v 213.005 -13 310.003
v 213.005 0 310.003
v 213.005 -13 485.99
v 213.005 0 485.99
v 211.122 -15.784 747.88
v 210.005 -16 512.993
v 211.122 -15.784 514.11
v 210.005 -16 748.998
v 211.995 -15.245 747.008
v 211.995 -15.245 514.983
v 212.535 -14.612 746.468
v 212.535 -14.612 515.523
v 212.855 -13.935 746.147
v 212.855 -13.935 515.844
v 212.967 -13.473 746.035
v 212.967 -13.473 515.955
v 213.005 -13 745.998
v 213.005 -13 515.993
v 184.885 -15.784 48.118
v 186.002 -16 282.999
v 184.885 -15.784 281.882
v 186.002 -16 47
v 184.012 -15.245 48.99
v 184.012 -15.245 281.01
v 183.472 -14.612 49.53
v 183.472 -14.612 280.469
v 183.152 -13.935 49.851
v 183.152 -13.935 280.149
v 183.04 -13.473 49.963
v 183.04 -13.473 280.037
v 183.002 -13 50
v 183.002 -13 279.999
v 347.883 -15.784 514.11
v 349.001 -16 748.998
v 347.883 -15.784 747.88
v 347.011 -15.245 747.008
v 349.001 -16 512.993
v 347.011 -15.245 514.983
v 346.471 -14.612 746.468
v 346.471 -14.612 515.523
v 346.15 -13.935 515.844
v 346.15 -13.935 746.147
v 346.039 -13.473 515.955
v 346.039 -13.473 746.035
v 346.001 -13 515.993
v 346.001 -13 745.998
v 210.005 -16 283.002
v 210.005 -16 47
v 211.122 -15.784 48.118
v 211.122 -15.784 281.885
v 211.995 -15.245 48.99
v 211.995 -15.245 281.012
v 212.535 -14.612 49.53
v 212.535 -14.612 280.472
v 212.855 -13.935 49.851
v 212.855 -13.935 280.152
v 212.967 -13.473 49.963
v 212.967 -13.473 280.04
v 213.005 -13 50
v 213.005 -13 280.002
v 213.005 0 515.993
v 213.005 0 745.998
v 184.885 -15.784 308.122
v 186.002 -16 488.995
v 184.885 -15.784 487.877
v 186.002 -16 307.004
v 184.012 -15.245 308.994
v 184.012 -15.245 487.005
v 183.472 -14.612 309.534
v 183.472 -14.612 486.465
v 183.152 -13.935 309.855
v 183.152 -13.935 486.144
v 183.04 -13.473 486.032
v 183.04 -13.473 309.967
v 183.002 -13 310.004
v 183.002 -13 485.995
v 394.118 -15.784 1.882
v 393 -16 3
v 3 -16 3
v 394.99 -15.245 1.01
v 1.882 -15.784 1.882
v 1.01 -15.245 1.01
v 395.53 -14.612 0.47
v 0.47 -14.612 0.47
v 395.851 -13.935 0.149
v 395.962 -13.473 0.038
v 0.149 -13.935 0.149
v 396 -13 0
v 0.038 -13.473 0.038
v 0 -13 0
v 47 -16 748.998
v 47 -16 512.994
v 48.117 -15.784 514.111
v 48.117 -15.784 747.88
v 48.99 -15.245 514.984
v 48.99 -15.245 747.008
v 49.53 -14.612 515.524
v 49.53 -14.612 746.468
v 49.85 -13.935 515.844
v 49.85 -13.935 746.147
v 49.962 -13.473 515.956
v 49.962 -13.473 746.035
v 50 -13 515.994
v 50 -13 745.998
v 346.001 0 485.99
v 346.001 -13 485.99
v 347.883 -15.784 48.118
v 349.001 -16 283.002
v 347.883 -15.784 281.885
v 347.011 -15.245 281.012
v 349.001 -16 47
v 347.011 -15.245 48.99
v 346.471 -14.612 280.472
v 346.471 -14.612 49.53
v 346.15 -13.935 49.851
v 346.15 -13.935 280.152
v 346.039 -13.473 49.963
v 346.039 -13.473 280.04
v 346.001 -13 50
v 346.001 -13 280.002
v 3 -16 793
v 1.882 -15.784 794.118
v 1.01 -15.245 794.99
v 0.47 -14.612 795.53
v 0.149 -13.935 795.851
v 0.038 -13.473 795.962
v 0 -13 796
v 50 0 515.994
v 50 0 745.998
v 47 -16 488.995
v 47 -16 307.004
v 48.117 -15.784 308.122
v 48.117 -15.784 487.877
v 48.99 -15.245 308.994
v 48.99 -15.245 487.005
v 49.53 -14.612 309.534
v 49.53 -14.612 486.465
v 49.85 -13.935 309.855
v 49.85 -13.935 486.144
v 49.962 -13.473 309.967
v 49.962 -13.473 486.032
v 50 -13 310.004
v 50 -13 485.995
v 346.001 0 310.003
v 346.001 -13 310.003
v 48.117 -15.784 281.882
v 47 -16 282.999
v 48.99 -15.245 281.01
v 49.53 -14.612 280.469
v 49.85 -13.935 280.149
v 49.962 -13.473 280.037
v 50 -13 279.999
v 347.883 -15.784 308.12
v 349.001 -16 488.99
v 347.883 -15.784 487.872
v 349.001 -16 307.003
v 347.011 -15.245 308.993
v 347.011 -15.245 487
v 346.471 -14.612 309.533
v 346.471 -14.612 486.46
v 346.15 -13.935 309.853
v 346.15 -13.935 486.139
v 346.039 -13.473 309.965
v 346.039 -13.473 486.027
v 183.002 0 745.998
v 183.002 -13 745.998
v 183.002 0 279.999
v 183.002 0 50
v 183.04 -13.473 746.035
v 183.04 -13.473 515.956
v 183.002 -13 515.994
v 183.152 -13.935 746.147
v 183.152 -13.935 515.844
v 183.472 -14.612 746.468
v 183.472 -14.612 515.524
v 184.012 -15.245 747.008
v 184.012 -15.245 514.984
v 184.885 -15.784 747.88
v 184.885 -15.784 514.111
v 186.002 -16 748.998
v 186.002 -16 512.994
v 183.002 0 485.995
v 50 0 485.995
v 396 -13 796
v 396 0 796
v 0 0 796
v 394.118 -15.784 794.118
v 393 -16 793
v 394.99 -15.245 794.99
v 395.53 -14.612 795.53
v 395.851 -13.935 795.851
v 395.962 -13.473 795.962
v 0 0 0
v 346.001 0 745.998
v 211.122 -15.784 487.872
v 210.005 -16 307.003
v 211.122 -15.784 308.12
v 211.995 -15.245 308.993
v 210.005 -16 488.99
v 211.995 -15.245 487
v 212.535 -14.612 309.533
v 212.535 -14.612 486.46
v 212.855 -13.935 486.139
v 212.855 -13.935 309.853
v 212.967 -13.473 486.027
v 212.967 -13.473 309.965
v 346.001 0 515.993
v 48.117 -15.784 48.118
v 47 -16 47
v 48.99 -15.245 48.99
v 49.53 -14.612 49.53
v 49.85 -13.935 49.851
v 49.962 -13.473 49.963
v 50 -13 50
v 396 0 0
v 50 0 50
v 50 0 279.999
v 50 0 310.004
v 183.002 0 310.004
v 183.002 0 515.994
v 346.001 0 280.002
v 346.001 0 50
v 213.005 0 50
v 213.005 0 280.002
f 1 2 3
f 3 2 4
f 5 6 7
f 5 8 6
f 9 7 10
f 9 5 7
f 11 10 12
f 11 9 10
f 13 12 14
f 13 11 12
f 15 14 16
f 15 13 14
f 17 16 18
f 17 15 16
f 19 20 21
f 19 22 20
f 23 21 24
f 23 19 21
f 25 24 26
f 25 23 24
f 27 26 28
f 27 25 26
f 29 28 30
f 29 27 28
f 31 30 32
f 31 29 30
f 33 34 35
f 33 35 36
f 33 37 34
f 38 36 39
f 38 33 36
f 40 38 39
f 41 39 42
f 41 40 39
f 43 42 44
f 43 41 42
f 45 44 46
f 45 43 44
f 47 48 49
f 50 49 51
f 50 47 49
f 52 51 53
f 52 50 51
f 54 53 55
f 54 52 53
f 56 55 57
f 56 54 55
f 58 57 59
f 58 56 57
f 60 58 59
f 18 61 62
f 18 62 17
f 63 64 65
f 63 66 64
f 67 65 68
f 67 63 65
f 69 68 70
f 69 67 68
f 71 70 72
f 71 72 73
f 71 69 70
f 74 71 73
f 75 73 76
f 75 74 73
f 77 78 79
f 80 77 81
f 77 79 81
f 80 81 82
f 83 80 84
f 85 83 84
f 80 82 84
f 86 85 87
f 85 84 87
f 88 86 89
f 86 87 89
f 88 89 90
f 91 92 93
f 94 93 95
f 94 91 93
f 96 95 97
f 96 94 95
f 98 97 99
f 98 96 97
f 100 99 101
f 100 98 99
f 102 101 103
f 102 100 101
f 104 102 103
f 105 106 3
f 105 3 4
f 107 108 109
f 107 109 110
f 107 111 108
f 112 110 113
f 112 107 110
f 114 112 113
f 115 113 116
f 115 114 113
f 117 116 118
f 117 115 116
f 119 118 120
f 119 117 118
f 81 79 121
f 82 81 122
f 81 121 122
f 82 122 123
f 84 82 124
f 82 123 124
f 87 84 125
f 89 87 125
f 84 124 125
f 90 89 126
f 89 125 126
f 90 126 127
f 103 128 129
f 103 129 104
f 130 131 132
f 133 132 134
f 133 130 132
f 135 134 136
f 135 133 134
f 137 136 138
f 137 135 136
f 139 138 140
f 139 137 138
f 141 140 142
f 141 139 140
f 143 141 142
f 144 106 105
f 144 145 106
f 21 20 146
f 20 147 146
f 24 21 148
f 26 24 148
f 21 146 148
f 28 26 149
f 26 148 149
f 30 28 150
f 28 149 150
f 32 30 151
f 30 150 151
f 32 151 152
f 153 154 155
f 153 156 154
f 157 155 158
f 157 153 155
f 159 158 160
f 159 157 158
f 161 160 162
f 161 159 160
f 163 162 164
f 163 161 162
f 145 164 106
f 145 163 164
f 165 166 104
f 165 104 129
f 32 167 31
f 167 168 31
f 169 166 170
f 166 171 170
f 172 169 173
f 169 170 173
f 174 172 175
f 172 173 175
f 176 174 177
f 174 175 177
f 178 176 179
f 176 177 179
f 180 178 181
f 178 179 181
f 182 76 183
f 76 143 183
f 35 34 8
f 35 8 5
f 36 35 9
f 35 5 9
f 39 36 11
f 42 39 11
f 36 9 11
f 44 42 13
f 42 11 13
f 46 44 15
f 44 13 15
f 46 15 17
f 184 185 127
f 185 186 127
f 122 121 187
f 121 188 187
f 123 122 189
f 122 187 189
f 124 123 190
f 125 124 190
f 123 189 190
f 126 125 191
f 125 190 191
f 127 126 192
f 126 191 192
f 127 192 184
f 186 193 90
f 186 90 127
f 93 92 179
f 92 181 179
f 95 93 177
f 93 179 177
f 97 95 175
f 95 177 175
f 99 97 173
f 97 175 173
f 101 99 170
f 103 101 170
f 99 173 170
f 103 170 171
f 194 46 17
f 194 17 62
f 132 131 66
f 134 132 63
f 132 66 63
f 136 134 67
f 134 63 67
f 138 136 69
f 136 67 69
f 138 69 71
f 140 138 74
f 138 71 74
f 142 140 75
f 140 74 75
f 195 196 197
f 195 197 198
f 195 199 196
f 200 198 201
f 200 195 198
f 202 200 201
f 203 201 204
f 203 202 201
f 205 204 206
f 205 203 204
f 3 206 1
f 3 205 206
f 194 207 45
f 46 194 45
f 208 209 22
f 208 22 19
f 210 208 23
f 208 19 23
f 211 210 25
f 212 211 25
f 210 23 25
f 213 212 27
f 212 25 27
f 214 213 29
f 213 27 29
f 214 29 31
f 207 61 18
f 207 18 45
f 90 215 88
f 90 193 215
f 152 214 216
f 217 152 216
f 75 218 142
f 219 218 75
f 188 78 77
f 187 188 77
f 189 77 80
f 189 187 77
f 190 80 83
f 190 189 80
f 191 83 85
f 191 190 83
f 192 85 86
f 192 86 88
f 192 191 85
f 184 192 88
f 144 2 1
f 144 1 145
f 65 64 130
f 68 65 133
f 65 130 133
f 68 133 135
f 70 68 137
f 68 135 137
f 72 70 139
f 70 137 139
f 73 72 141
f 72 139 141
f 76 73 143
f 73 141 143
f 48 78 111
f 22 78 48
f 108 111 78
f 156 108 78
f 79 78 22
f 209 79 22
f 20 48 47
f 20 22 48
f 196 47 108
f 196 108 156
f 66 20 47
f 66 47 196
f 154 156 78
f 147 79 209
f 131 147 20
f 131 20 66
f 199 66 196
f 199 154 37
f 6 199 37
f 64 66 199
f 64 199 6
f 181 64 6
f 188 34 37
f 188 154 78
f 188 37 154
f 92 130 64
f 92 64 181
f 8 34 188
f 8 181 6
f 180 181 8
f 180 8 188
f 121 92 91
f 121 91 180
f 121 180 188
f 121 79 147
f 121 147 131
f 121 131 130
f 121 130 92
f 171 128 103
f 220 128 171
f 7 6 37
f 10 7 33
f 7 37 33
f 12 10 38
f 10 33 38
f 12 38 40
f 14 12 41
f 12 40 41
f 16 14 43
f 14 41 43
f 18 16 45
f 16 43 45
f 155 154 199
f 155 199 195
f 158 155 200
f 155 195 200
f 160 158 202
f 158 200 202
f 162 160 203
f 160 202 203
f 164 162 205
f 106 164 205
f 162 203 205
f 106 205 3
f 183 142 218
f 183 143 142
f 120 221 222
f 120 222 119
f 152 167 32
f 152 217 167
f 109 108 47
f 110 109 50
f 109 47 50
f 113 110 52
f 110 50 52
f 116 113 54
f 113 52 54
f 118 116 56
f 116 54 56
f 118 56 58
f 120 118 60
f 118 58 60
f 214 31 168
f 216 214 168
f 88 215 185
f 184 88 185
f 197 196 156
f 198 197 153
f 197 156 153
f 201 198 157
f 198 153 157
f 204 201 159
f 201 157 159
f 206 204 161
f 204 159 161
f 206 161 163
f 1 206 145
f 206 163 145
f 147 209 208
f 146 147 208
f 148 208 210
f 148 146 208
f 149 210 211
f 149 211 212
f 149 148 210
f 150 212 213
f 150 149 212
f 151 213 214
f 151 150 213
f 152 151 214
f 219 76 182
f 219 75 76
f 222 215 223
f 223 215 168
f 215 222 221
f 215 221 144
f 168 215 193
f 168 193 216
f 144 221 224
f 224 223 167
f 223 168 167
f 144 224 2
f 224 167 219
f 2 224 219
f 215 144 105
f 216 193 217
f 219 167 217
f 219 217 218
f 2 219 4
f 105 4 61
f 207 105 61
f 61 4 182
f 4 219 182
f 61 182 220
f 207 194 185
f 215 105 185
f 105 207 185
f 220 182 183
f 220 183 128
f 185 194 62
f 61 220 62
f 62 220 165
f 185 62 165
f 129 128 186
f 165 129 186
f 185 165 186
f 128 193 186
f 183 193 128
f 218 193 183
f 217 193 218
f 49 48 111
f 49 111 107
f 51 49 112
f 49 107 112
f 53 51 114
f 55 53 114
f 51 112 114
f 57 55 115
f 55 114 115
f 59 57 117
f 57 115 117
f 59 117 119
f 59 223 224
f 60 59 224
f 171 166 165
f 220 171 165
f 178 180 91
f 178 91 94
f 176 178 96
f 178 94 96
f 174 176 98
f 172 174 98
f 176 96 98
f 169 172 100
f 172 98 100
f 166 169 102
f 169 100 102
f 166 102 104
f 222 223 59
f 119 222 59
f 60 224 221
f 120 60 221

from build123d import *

# Parameters (mm, degrees)
F0_W      = 28.8499742746
F0_H      = 37.8827601671
F1_DEPTH  = 16
F2_DEPTH  = 296
F3_DEPTH  = 996
F4_W      = 199.8313069344
F4_H      = 801.1276721954
F5_DEPTH  = 5
F6_DEPTH  = 39.21
F7_DEPTH  = 2.24
F8_DEPTH  = 55.66
F9_DEPTH  = 1.59
F10_W     = 54.77245152
F10_H     = 895.9976721954
F11_DEPTH = 5
F12_DEPTH = 5.86
F13_DEPTH = 18.91
F14_W     = 83.0026693535
F14_H     = 34.9487662315
F14_H_2   = 55.274695158
F15_W     = 82.9961860609
F15_H     = 44.8832511902
F15_H_2   = 52.5203943253
F16_DEPTH = 5
F17_DEPTH = 300
F18_DEPTH = 300
F19_DEPTH = 324.79
F20_DEPTH = 324.79
F21_DEPTH = 250
F22_DEPTH = 250
F23_DEPTH = 100
F24_DEPTH = 100
F25_DEPTH = 50
F26_DEPTH = 50
F27_DEPTH = 134.02
F28_DEPTH = 100
F29_DEPTH = 100
F30_DEPTH = 100
F31_DEPTH = 50
F32_DEPTH = 54.95
F33_DEPTH = 50
F34_DEPTH = 109.29
F35_DEPTH = 14.88
F36_DEPTH = 230.15
F37_DEPTH = 230.15
F38_DEPTH = 22.52
F39_DEPTH = 77.2
F40_DEPTH = 77.2
F41_DEPTH = 11
F42_DEPTH = 200
F43_DEPTH = 200
F44_DEPTH = 200
F45_DEPTH = 70
F46_DEPTH = 70
F47_DEPTH = 70
F48_DEPTH = 70
F49_DEPTH = 100
F50_DEPTH = 50
F51_DEPTH = 100
F52_DEPTH = 50
F53_R     = 3


with BuildPart() as f1:
    # F0 (on Front) → F1 (new body)
    with BuildSketch(Plane.XZ):
        with Locations((14.4249871373, 18.9413800836)):
            Rectangle(F0_W, F0_H)
    extrude(amount=F1_DEPTH)

    # F2 (add): a face of the model
    f2_faces = [f1.faces().sort_by_distance(p)[0] for p in [
        (0, -8, 18.9413800836),
    ]]
    extrude(f2_faces, amount=-F2_DEPTH)

    # F3 (add): a face of the model
    f3_faces = [f1.faces().sort_by_distance(p)[0] for p in [
        (148, -8, 0),
    ]]
    extrude(f3_faces, amount=-F3_DEPTH)

    # F4 (on face) → F5 (cut)
    with BuildSketch(Plane.XZ.offset(16)):
        with Locations((148.3252942562, 506.2239170074)):
            Rectangle(F4_W, F4_H)
    extrude(amount=-F5_DEPTH, mode=Mode.SUBTRACT)

    # F6 (cut): a face of the model
    f6_faces = [f1.faces().sort_by_distance(p)[0] for p in [
        (148.3252942562, -13.5, 906.7877531052),
    ]]
    extrude(f6_faces, amount=-F6_DEPTH, mode=Mode.SUBTRACT)

    # F7 (add): a face of the model
    f7_faces = [f1.faces().sort_by_distance(p)[0] for p in [
        (248.2409477234, -13.5, 525.8289170074),
    ]]
    extrude(f7_faces, amount=F7_DEPTH)

    # F8 (cut): a face of the model
    f8_faces = [f1.faces().sort_by_distance(p)[0] for p in [
        (147.2052942562, -13.5, 105.6600809097),
    ]]
    extrude(f8_faces, amount=-F8_DEPTH, mode=Mode.SUBTRACT)

    # F9 (add): a face of the model
    f9_faces = [f1.faces().sort_by_distance(p)[0] for p in [
        (48.409640789, -13.5, 497.9989170074),
    ]]
    extrude(f9_faces, amount=F9_DEPTH)

    # F10 (on face) → F11 (join)
    with BuildSketch(Plane.XZ.offset(11)):
        with Locations((154.5285359025, 497.9989170074)):
            Rectangle(F10_W, F10_H)
    extrude(amount=F11_DEPTH)

    # F12 (cut): a face of the model
    f12_faces = [f1.faces().sort_by_distance(p)[0] for p in [
        (127.1423101425, -13.5, 497.9989170074),
    ]]
    extrude(f12_faces, amount=-F12_DEPTH, mode=Mode.SUBTRACT)

    # F13 (cut): a face of the model
    f13_faces = [f1.faces().sort_by_distance(p)[0] for p in [
        (181.9147616625, -13.5, 497.9989170074),
    ]]
    extrude(f13_faces, amount=-F13_DEPTH, mode=Mode.SUBTRACT)

    # F14 (on face) + F15 (on face) → F16 (join)
    with BuildSketch(Plane.XZ.offset(11)):
        with Locations((91.5009754658, 853.3093035221)):
            Rectangle(F14_W, F14_H)
        with Locations((91.5009754658, 511.6568356752)):
            Rectangle(F14_W, F14_H_2)
    with BuildSketch(Plane.XZ.offset(11)):
        with Locations((204.5028546929, 853.7013530731)):
            Rectangle(F15_W, F15_H)
        with Locations((204.5028546929, 576.5425562859)):
            Rectangle(F15_W, F15_H_2)
    extrude(amount=F16_DEPTH)

    # F17 (add): faces of the model
    f17_faces = [f1.faces().sort_by_distance(p)[0] for p in [
        (204.5028546929, -13.5, 550.2823591232),
        (91.5009754658, -13.5, 484.0194880962),
    ]]
    extrude(f17_faces, amount=F17_DEPTH)

    # F18 (cut): faces of the model
    f18_faces = [f1.faces().sort_by_distance(p)[0] for p in [
        (91.5009754658, -13.5, 539.2941832542),
        (204.5028546929, -13.5, 602.8027534485),
    ]]
    extrude(f18_faces, amount=-F18_DEPTH, mode=Mode.SUBTRACT)

    # F19 (add): a face of the model
    f19_faces = [f1.faces().sort_by_distance(p)[0] for p in [
        (91.5009754658, -13.5, 835.8349204063),
    ]]
    extrude(f19_faces, amount=F19_DEPTH)

    # F20 (cut): a face of the model
    f20_faces = [f1.faces().sort_by_distance(p)[0] for p in [
        (91.5009754658, -13.5, 870.7836866379),
    ]]
    extrude(f20_faces, amount=-F20_DEPTH, mode=Mode.SUBTRACT)

    # F21 (add): a face of the model
    f21_faces = [f1.faces().sort_by_distance(p)[0] for p in [
        (91.5009754658, -13.5, 239.2941832542),
    ]]
    extrude(f21_faces, amount=F21_DEPTH)

    # F22 (cut): a face of the model
    f22_faces = [f1.faces().sort_by_distance(p)[0] for p in [
        (91.5009754658, -13.5, 184.0194880962),
    ]]
    extrude(f22_faces, amount=-F22_DEPTH, mode=Mode.SUBTRACT)

    # F23 (add): a face of the model
    f23_faces = [f1.faces().sort_by_distance(p)[0] for p in [
        (91.5009754658, -13.5, 545.9936866379),
    ]]
    extrude(f23_faces, amount=F23_DEPTH)

    # F24 (cut): a face of the model
    f24_faces = [f1.faces().sort_by_distance(p)[0] for p in [
        (91.5009754658, -13.5, 511.0449204063),
    ]]
    extrude(f24_faces, amount=-F24_DEPTH, mode=Mode.SUBTRACT)

    # F25 (add): a face of the model
    f25_faces = [f1.faces().sort_by_distance(p)[0] for p in [
        (91.5009754658, -13.5, 645.9936866379),
    ]]
    extrude(f25_faces, amount=F25_DEPTH)

    # F26 (cut): a face of the model
    f26_faces = [f1.faces().sort_by_distance(p)[0] for p in [
        (91.5009754658, -13.5, 611.0449204063),
    ]]
    extrude(f26_faces, amount=-F26_DEPTH, mode=Mode.SUBTRACT)

    # F27 (add): a face of the model
    f27_faces = [f1.faces().sort_by_distance(p)[0] for p in [
        (91.5009754658, -13.5, 434.0194880962),
    ]]
    extrude(f27_faces, amount=F27_DEPTH)

    # F28 (cut): a face of the model
    f28_faces = [f1.faces().sort_by_distance(p)[0] for p in [
        (91.5009754658, -13.5, 299.9994880962),
    ]]
    extrude(f28_faces, amount=-F28_DEPTH, mode=Mode.SUBTRACT)

    # F29 (add): a face of the model
    f29_faces = [f1.faces().sort_by_distance(p)[0] for p in [
        (91.5009754658, -13.5, 661.0449204063),
    ]]
    extrude(f29_faces, amount=F29_DEPTH)

    # F30 (cut): a face of the model
    f30_faces = [f1.faces().sort_by_distance(p)[0] for p in [
        (91.5009754658, -13.5, 695.9936866379),
    ]]
    extrude(f30_faces, amount=-F30_DEPTH, mode=Mode.SUBTRACT)

    # F31 (add): a face of the model
    f31_faces = [f1.faces().sort_by_distance(p)[0] for p in [
        (91.5009754658, -13.5, 595.9936866379),
    ]]
    extrude(f31_faces, amount=F31_DEPTH)

    # F32 (cut): a face of the model
    f32_faces = [f1.faces().sort_by_distance(p)[0] for p in [
        (91.5009754658, -13.5, 561.0449204063),
    ]]
    extrude(f32_faces, amount=-F32_DEPTH, mode=Mode.SUBTRACT)

    # F33 (add): a face of the model
    f33_faces = [f1.faces().sort_by_distance(p)[0] for p in [
        (91.5009754658, -13.5, 399.9994880962),
    ]]
    extrude(f33_faces, amount=F33_DEPTH)

    # F34 (cut): a face of the model
    f34_faces = [f1.faces().sort_by_distance(p)[0] for p in [
        (91.5009754658, -13.5, 489.2941832542),
    ]]
    extrude(f34_faces, amount=-F34_DEPTH, mode=Mode.SUBTRACT)

    # F35 (cut): a face of the model
    f35_faces = [f1.faces().sort_by_distance(p)[0] for p in [
        (204.5028546929, -13.5, 831.259727478),
    ]]
    extrude(f35_faces, amount=-F35_DEPTH, mode=Mode.SUBTRACT)

    # F36 (add): a face of the model
    f36_faces = [f1.faces().sort_by_distance(p)[0] for p in [
        (204.5028546929, -13.5, 846.139727478),
    ]]
    extrude(f36_faces, amount=F36_DEPTH)

    # F37 (cut): a face of the model
    f37_faces = [f1.faces().sort_by_distance(p)[0] for p in [
        (204.5028546929, -13.5, 876.1429786682),
    ]]
    extrude(f37_faces, amount=-F37_DEPTH, mode=Mode.SUBTRACT)

    # F38 (cut): a face of the model
    f38_faces = [f1.faces().sort_by_distance(p)[0] for p in [
        (204.5028546929, -13.5, 250.2823591232),
    ]]
    extrude(f38_faces, amount=-F38_DEPTH, mode=Mode.SUBTRACT)

    # F39 (add): a face of the model
    f39_faces = [f1.faces().sort_by_distance(p)[0] for p in [
        (204.5028546929, -13.5, 302.8027534485),
    ]]
    extrude(f39_faces, amount=F39_DEPTH)

    # F40 (cut): a face of the model
    f40_faces = [f1.faces().sort_by_distance(p)[0] for p in [
        (204.5028546929, -13.5, 272.8023591232),
    ]]
    extrude(f40_faces, amount=-F40_DEPTH, mode=Mode.SUBTRACT)

    # F41 (cut): faces of the model
    f41_faces = [f1.faces().sort_by_distance(p)[0] for p in [
        (91.5009754658, -11, 795.9957198715),
        (204.5028546929, -11, 795.9953658867),
        (204.5028546929, -11, 497.9962404633),
        (91.5009754658, -11, 497.9995518303),
        (91.5009754658, -11, 199.999784503),
        (204.5028546929, -11, 200.0012200165),
    ]]
    extrude(f41_faces, amount=-F41_DEPTH, mode=Mode.SUBTRACT)

    # F42 (add): faces of the model
    f42_faces = [f1.faces().sort_by_distance(p)[0] for p in [
        (204.5028546929, -8, 615.989727478),
        (91.5009754658, -8, 615.9949204063),
    ]]
    extrude(f42_faces, amount=F42_DEPTH)

    # F43 (add): faces of the model
    f43_faces = [f1.faces().sort_by_distance(p)[0] for p in [
        (91.5009754658, -8, 945.9977531052),
        (204.5028546929, -8, 945.9977531052),
    ]]
    extrude(f43_faces, amount=F43_DEPTH)

    # F44 (cut): faces of the model
    f44_faces = [f1.faces().sort_by_distance(p)[0] for p in [
        (148, -8, 996),
        (91.5009754658, -8, 645.9936866379),
        (204.5028546929, -8, 645.9929786682),
    ]]
    extrude(f44_faces, amount=-F44_DEPTH, mode=Mode.SUBTRACT)

    # F45 (add): faces of the model
    f45_faces = [f1.faces().sort_by_distance(p)[0] for p in [
        (204.5028546929, -8, 350.0023591232),
        (91.5009754658, -8, 349.9994880962),
    ]]
    extrude(f45_faces, amount=F45_DEPTH)

    # F46 (cut): faces of the model
    f46_faces = [f1.faces().sort_by_distance(p)[0] for p in [
        (204.5028546929, -8, 380.0027534485),
        (91.5009754658, -8, 380.0041832542),
    ]]
    extrude(f46_faces, amount=-F46_DEPTH, mode=Mode.SUBTRACT)

    # F47 (add): faces of the model
    f47_faces = [f1.faces().sort_by_distance(p)[0] for p in [
        (204.5028546929, -8, 445.9929786682),
        (91.5009754658, -8, 445.9936866379),
    ]]
    extrude(f47_faces, amount=F47_DEPTH)

    # F48 (cut): faces of the model
    f48_faces = [f1.faces().sort_by_distance(p)[0] for p in [
        (204.5028546929, -8, 415.989727478),
        (91.5009754658, -8, 415.9949204063),
    ]]
    extrude(f48_faces, amount=-F48_DEPTH, mode=Mode.SUBTRACT)

    # F49 (add): a face of the model
    f49_faces = [f1.faces().sort_by_distance(p)[0] for p in [
        (296, -8, 398),
    ]]
    extrude(f49_faces, amount=F49_DEPTH)

    # F50 (add): faces of the model
    f50_faces = [f1.faces().sort_by_distance(p)[0] for p in [
        (163.0047616625, -8, 397.9962404633),
        (163.0047616625, -8, 165.0012200165),
        (163.0047616625, -8, 630.9953658867),
    ]]
    extrude(f50_faces, amount=F50_DEPTH)

    # F51 (cut): faces of the model
    f51_faces = [f1.faces().sort_by_distance(p)[0] for p in [
        (246.0009477234, -8, 630.9953658867),
        (246.0009477234, -8, 397.9962404633),
        (246.0009477234, -8, 165.0012200165),
    ]]
    extrude(f51_faces, amount=-F51_DEPTH, mode=Mode.SUBTRACT)

    # F52 (cut): faces of the model
    f52_faces = [f1.faces().sort_by_distance(p)[0] for p in [
        (133.0023101425, -8, 397.9995518303),
        (133.0023101425, -8, 630.9957198715),
        (133.0023101425, -8, 164.999784503),
    ]]
    extrude(f52_faces, amount=-F52_DEPTH, mode=Mode.SUBTRACT)

    # F53
    f53_edges = [f1.edges().sort_by_distance(p)[0] for p in [
        (0, -16, 398),
        (198, -16, 0),
        (396, -16, 398),
        (198, -16, 796),
        (116.500975, -16, 279.999488),
        (183.00231, -16, 164.999785),
        (116.500975, -16, 50.000081),
        (49.999641, -16, 164.999785),
        (279.502855, -16, 280.002359),
        (346.000948, -16, 165.00122),
        (279.502855, -16, 50.000081),
        (213.004762, -16, 165.00122),
        (279.502855, -16, 310.002753),
        (213.004762, -16, 397.99624),
        (279.502855, -16, 485.989727),
        (346.000948, -16, 397.99624),
        (116.500975, -16, 310.004183),
        (49.999641, -16, 397.999552),
        (116.500975, -16, 485.99492),
        (183.00231, -16, 397.999552),
        (116.500975, -16, 515.993687),
        (49.999641, -16, 630.99572),
        (116.500975, -16, 745.997753),
        (183.00231, -16, 630.99572),
        (213.004762, -16, 630.995366),
        (279.502855, -16, 745.997753),
        (346.000948, -16, 630.995366),
        (279.502855, -16, 515.992979),
    ]]
    fillet(f53_edges, radius=F53_R)


solid = f1.part
